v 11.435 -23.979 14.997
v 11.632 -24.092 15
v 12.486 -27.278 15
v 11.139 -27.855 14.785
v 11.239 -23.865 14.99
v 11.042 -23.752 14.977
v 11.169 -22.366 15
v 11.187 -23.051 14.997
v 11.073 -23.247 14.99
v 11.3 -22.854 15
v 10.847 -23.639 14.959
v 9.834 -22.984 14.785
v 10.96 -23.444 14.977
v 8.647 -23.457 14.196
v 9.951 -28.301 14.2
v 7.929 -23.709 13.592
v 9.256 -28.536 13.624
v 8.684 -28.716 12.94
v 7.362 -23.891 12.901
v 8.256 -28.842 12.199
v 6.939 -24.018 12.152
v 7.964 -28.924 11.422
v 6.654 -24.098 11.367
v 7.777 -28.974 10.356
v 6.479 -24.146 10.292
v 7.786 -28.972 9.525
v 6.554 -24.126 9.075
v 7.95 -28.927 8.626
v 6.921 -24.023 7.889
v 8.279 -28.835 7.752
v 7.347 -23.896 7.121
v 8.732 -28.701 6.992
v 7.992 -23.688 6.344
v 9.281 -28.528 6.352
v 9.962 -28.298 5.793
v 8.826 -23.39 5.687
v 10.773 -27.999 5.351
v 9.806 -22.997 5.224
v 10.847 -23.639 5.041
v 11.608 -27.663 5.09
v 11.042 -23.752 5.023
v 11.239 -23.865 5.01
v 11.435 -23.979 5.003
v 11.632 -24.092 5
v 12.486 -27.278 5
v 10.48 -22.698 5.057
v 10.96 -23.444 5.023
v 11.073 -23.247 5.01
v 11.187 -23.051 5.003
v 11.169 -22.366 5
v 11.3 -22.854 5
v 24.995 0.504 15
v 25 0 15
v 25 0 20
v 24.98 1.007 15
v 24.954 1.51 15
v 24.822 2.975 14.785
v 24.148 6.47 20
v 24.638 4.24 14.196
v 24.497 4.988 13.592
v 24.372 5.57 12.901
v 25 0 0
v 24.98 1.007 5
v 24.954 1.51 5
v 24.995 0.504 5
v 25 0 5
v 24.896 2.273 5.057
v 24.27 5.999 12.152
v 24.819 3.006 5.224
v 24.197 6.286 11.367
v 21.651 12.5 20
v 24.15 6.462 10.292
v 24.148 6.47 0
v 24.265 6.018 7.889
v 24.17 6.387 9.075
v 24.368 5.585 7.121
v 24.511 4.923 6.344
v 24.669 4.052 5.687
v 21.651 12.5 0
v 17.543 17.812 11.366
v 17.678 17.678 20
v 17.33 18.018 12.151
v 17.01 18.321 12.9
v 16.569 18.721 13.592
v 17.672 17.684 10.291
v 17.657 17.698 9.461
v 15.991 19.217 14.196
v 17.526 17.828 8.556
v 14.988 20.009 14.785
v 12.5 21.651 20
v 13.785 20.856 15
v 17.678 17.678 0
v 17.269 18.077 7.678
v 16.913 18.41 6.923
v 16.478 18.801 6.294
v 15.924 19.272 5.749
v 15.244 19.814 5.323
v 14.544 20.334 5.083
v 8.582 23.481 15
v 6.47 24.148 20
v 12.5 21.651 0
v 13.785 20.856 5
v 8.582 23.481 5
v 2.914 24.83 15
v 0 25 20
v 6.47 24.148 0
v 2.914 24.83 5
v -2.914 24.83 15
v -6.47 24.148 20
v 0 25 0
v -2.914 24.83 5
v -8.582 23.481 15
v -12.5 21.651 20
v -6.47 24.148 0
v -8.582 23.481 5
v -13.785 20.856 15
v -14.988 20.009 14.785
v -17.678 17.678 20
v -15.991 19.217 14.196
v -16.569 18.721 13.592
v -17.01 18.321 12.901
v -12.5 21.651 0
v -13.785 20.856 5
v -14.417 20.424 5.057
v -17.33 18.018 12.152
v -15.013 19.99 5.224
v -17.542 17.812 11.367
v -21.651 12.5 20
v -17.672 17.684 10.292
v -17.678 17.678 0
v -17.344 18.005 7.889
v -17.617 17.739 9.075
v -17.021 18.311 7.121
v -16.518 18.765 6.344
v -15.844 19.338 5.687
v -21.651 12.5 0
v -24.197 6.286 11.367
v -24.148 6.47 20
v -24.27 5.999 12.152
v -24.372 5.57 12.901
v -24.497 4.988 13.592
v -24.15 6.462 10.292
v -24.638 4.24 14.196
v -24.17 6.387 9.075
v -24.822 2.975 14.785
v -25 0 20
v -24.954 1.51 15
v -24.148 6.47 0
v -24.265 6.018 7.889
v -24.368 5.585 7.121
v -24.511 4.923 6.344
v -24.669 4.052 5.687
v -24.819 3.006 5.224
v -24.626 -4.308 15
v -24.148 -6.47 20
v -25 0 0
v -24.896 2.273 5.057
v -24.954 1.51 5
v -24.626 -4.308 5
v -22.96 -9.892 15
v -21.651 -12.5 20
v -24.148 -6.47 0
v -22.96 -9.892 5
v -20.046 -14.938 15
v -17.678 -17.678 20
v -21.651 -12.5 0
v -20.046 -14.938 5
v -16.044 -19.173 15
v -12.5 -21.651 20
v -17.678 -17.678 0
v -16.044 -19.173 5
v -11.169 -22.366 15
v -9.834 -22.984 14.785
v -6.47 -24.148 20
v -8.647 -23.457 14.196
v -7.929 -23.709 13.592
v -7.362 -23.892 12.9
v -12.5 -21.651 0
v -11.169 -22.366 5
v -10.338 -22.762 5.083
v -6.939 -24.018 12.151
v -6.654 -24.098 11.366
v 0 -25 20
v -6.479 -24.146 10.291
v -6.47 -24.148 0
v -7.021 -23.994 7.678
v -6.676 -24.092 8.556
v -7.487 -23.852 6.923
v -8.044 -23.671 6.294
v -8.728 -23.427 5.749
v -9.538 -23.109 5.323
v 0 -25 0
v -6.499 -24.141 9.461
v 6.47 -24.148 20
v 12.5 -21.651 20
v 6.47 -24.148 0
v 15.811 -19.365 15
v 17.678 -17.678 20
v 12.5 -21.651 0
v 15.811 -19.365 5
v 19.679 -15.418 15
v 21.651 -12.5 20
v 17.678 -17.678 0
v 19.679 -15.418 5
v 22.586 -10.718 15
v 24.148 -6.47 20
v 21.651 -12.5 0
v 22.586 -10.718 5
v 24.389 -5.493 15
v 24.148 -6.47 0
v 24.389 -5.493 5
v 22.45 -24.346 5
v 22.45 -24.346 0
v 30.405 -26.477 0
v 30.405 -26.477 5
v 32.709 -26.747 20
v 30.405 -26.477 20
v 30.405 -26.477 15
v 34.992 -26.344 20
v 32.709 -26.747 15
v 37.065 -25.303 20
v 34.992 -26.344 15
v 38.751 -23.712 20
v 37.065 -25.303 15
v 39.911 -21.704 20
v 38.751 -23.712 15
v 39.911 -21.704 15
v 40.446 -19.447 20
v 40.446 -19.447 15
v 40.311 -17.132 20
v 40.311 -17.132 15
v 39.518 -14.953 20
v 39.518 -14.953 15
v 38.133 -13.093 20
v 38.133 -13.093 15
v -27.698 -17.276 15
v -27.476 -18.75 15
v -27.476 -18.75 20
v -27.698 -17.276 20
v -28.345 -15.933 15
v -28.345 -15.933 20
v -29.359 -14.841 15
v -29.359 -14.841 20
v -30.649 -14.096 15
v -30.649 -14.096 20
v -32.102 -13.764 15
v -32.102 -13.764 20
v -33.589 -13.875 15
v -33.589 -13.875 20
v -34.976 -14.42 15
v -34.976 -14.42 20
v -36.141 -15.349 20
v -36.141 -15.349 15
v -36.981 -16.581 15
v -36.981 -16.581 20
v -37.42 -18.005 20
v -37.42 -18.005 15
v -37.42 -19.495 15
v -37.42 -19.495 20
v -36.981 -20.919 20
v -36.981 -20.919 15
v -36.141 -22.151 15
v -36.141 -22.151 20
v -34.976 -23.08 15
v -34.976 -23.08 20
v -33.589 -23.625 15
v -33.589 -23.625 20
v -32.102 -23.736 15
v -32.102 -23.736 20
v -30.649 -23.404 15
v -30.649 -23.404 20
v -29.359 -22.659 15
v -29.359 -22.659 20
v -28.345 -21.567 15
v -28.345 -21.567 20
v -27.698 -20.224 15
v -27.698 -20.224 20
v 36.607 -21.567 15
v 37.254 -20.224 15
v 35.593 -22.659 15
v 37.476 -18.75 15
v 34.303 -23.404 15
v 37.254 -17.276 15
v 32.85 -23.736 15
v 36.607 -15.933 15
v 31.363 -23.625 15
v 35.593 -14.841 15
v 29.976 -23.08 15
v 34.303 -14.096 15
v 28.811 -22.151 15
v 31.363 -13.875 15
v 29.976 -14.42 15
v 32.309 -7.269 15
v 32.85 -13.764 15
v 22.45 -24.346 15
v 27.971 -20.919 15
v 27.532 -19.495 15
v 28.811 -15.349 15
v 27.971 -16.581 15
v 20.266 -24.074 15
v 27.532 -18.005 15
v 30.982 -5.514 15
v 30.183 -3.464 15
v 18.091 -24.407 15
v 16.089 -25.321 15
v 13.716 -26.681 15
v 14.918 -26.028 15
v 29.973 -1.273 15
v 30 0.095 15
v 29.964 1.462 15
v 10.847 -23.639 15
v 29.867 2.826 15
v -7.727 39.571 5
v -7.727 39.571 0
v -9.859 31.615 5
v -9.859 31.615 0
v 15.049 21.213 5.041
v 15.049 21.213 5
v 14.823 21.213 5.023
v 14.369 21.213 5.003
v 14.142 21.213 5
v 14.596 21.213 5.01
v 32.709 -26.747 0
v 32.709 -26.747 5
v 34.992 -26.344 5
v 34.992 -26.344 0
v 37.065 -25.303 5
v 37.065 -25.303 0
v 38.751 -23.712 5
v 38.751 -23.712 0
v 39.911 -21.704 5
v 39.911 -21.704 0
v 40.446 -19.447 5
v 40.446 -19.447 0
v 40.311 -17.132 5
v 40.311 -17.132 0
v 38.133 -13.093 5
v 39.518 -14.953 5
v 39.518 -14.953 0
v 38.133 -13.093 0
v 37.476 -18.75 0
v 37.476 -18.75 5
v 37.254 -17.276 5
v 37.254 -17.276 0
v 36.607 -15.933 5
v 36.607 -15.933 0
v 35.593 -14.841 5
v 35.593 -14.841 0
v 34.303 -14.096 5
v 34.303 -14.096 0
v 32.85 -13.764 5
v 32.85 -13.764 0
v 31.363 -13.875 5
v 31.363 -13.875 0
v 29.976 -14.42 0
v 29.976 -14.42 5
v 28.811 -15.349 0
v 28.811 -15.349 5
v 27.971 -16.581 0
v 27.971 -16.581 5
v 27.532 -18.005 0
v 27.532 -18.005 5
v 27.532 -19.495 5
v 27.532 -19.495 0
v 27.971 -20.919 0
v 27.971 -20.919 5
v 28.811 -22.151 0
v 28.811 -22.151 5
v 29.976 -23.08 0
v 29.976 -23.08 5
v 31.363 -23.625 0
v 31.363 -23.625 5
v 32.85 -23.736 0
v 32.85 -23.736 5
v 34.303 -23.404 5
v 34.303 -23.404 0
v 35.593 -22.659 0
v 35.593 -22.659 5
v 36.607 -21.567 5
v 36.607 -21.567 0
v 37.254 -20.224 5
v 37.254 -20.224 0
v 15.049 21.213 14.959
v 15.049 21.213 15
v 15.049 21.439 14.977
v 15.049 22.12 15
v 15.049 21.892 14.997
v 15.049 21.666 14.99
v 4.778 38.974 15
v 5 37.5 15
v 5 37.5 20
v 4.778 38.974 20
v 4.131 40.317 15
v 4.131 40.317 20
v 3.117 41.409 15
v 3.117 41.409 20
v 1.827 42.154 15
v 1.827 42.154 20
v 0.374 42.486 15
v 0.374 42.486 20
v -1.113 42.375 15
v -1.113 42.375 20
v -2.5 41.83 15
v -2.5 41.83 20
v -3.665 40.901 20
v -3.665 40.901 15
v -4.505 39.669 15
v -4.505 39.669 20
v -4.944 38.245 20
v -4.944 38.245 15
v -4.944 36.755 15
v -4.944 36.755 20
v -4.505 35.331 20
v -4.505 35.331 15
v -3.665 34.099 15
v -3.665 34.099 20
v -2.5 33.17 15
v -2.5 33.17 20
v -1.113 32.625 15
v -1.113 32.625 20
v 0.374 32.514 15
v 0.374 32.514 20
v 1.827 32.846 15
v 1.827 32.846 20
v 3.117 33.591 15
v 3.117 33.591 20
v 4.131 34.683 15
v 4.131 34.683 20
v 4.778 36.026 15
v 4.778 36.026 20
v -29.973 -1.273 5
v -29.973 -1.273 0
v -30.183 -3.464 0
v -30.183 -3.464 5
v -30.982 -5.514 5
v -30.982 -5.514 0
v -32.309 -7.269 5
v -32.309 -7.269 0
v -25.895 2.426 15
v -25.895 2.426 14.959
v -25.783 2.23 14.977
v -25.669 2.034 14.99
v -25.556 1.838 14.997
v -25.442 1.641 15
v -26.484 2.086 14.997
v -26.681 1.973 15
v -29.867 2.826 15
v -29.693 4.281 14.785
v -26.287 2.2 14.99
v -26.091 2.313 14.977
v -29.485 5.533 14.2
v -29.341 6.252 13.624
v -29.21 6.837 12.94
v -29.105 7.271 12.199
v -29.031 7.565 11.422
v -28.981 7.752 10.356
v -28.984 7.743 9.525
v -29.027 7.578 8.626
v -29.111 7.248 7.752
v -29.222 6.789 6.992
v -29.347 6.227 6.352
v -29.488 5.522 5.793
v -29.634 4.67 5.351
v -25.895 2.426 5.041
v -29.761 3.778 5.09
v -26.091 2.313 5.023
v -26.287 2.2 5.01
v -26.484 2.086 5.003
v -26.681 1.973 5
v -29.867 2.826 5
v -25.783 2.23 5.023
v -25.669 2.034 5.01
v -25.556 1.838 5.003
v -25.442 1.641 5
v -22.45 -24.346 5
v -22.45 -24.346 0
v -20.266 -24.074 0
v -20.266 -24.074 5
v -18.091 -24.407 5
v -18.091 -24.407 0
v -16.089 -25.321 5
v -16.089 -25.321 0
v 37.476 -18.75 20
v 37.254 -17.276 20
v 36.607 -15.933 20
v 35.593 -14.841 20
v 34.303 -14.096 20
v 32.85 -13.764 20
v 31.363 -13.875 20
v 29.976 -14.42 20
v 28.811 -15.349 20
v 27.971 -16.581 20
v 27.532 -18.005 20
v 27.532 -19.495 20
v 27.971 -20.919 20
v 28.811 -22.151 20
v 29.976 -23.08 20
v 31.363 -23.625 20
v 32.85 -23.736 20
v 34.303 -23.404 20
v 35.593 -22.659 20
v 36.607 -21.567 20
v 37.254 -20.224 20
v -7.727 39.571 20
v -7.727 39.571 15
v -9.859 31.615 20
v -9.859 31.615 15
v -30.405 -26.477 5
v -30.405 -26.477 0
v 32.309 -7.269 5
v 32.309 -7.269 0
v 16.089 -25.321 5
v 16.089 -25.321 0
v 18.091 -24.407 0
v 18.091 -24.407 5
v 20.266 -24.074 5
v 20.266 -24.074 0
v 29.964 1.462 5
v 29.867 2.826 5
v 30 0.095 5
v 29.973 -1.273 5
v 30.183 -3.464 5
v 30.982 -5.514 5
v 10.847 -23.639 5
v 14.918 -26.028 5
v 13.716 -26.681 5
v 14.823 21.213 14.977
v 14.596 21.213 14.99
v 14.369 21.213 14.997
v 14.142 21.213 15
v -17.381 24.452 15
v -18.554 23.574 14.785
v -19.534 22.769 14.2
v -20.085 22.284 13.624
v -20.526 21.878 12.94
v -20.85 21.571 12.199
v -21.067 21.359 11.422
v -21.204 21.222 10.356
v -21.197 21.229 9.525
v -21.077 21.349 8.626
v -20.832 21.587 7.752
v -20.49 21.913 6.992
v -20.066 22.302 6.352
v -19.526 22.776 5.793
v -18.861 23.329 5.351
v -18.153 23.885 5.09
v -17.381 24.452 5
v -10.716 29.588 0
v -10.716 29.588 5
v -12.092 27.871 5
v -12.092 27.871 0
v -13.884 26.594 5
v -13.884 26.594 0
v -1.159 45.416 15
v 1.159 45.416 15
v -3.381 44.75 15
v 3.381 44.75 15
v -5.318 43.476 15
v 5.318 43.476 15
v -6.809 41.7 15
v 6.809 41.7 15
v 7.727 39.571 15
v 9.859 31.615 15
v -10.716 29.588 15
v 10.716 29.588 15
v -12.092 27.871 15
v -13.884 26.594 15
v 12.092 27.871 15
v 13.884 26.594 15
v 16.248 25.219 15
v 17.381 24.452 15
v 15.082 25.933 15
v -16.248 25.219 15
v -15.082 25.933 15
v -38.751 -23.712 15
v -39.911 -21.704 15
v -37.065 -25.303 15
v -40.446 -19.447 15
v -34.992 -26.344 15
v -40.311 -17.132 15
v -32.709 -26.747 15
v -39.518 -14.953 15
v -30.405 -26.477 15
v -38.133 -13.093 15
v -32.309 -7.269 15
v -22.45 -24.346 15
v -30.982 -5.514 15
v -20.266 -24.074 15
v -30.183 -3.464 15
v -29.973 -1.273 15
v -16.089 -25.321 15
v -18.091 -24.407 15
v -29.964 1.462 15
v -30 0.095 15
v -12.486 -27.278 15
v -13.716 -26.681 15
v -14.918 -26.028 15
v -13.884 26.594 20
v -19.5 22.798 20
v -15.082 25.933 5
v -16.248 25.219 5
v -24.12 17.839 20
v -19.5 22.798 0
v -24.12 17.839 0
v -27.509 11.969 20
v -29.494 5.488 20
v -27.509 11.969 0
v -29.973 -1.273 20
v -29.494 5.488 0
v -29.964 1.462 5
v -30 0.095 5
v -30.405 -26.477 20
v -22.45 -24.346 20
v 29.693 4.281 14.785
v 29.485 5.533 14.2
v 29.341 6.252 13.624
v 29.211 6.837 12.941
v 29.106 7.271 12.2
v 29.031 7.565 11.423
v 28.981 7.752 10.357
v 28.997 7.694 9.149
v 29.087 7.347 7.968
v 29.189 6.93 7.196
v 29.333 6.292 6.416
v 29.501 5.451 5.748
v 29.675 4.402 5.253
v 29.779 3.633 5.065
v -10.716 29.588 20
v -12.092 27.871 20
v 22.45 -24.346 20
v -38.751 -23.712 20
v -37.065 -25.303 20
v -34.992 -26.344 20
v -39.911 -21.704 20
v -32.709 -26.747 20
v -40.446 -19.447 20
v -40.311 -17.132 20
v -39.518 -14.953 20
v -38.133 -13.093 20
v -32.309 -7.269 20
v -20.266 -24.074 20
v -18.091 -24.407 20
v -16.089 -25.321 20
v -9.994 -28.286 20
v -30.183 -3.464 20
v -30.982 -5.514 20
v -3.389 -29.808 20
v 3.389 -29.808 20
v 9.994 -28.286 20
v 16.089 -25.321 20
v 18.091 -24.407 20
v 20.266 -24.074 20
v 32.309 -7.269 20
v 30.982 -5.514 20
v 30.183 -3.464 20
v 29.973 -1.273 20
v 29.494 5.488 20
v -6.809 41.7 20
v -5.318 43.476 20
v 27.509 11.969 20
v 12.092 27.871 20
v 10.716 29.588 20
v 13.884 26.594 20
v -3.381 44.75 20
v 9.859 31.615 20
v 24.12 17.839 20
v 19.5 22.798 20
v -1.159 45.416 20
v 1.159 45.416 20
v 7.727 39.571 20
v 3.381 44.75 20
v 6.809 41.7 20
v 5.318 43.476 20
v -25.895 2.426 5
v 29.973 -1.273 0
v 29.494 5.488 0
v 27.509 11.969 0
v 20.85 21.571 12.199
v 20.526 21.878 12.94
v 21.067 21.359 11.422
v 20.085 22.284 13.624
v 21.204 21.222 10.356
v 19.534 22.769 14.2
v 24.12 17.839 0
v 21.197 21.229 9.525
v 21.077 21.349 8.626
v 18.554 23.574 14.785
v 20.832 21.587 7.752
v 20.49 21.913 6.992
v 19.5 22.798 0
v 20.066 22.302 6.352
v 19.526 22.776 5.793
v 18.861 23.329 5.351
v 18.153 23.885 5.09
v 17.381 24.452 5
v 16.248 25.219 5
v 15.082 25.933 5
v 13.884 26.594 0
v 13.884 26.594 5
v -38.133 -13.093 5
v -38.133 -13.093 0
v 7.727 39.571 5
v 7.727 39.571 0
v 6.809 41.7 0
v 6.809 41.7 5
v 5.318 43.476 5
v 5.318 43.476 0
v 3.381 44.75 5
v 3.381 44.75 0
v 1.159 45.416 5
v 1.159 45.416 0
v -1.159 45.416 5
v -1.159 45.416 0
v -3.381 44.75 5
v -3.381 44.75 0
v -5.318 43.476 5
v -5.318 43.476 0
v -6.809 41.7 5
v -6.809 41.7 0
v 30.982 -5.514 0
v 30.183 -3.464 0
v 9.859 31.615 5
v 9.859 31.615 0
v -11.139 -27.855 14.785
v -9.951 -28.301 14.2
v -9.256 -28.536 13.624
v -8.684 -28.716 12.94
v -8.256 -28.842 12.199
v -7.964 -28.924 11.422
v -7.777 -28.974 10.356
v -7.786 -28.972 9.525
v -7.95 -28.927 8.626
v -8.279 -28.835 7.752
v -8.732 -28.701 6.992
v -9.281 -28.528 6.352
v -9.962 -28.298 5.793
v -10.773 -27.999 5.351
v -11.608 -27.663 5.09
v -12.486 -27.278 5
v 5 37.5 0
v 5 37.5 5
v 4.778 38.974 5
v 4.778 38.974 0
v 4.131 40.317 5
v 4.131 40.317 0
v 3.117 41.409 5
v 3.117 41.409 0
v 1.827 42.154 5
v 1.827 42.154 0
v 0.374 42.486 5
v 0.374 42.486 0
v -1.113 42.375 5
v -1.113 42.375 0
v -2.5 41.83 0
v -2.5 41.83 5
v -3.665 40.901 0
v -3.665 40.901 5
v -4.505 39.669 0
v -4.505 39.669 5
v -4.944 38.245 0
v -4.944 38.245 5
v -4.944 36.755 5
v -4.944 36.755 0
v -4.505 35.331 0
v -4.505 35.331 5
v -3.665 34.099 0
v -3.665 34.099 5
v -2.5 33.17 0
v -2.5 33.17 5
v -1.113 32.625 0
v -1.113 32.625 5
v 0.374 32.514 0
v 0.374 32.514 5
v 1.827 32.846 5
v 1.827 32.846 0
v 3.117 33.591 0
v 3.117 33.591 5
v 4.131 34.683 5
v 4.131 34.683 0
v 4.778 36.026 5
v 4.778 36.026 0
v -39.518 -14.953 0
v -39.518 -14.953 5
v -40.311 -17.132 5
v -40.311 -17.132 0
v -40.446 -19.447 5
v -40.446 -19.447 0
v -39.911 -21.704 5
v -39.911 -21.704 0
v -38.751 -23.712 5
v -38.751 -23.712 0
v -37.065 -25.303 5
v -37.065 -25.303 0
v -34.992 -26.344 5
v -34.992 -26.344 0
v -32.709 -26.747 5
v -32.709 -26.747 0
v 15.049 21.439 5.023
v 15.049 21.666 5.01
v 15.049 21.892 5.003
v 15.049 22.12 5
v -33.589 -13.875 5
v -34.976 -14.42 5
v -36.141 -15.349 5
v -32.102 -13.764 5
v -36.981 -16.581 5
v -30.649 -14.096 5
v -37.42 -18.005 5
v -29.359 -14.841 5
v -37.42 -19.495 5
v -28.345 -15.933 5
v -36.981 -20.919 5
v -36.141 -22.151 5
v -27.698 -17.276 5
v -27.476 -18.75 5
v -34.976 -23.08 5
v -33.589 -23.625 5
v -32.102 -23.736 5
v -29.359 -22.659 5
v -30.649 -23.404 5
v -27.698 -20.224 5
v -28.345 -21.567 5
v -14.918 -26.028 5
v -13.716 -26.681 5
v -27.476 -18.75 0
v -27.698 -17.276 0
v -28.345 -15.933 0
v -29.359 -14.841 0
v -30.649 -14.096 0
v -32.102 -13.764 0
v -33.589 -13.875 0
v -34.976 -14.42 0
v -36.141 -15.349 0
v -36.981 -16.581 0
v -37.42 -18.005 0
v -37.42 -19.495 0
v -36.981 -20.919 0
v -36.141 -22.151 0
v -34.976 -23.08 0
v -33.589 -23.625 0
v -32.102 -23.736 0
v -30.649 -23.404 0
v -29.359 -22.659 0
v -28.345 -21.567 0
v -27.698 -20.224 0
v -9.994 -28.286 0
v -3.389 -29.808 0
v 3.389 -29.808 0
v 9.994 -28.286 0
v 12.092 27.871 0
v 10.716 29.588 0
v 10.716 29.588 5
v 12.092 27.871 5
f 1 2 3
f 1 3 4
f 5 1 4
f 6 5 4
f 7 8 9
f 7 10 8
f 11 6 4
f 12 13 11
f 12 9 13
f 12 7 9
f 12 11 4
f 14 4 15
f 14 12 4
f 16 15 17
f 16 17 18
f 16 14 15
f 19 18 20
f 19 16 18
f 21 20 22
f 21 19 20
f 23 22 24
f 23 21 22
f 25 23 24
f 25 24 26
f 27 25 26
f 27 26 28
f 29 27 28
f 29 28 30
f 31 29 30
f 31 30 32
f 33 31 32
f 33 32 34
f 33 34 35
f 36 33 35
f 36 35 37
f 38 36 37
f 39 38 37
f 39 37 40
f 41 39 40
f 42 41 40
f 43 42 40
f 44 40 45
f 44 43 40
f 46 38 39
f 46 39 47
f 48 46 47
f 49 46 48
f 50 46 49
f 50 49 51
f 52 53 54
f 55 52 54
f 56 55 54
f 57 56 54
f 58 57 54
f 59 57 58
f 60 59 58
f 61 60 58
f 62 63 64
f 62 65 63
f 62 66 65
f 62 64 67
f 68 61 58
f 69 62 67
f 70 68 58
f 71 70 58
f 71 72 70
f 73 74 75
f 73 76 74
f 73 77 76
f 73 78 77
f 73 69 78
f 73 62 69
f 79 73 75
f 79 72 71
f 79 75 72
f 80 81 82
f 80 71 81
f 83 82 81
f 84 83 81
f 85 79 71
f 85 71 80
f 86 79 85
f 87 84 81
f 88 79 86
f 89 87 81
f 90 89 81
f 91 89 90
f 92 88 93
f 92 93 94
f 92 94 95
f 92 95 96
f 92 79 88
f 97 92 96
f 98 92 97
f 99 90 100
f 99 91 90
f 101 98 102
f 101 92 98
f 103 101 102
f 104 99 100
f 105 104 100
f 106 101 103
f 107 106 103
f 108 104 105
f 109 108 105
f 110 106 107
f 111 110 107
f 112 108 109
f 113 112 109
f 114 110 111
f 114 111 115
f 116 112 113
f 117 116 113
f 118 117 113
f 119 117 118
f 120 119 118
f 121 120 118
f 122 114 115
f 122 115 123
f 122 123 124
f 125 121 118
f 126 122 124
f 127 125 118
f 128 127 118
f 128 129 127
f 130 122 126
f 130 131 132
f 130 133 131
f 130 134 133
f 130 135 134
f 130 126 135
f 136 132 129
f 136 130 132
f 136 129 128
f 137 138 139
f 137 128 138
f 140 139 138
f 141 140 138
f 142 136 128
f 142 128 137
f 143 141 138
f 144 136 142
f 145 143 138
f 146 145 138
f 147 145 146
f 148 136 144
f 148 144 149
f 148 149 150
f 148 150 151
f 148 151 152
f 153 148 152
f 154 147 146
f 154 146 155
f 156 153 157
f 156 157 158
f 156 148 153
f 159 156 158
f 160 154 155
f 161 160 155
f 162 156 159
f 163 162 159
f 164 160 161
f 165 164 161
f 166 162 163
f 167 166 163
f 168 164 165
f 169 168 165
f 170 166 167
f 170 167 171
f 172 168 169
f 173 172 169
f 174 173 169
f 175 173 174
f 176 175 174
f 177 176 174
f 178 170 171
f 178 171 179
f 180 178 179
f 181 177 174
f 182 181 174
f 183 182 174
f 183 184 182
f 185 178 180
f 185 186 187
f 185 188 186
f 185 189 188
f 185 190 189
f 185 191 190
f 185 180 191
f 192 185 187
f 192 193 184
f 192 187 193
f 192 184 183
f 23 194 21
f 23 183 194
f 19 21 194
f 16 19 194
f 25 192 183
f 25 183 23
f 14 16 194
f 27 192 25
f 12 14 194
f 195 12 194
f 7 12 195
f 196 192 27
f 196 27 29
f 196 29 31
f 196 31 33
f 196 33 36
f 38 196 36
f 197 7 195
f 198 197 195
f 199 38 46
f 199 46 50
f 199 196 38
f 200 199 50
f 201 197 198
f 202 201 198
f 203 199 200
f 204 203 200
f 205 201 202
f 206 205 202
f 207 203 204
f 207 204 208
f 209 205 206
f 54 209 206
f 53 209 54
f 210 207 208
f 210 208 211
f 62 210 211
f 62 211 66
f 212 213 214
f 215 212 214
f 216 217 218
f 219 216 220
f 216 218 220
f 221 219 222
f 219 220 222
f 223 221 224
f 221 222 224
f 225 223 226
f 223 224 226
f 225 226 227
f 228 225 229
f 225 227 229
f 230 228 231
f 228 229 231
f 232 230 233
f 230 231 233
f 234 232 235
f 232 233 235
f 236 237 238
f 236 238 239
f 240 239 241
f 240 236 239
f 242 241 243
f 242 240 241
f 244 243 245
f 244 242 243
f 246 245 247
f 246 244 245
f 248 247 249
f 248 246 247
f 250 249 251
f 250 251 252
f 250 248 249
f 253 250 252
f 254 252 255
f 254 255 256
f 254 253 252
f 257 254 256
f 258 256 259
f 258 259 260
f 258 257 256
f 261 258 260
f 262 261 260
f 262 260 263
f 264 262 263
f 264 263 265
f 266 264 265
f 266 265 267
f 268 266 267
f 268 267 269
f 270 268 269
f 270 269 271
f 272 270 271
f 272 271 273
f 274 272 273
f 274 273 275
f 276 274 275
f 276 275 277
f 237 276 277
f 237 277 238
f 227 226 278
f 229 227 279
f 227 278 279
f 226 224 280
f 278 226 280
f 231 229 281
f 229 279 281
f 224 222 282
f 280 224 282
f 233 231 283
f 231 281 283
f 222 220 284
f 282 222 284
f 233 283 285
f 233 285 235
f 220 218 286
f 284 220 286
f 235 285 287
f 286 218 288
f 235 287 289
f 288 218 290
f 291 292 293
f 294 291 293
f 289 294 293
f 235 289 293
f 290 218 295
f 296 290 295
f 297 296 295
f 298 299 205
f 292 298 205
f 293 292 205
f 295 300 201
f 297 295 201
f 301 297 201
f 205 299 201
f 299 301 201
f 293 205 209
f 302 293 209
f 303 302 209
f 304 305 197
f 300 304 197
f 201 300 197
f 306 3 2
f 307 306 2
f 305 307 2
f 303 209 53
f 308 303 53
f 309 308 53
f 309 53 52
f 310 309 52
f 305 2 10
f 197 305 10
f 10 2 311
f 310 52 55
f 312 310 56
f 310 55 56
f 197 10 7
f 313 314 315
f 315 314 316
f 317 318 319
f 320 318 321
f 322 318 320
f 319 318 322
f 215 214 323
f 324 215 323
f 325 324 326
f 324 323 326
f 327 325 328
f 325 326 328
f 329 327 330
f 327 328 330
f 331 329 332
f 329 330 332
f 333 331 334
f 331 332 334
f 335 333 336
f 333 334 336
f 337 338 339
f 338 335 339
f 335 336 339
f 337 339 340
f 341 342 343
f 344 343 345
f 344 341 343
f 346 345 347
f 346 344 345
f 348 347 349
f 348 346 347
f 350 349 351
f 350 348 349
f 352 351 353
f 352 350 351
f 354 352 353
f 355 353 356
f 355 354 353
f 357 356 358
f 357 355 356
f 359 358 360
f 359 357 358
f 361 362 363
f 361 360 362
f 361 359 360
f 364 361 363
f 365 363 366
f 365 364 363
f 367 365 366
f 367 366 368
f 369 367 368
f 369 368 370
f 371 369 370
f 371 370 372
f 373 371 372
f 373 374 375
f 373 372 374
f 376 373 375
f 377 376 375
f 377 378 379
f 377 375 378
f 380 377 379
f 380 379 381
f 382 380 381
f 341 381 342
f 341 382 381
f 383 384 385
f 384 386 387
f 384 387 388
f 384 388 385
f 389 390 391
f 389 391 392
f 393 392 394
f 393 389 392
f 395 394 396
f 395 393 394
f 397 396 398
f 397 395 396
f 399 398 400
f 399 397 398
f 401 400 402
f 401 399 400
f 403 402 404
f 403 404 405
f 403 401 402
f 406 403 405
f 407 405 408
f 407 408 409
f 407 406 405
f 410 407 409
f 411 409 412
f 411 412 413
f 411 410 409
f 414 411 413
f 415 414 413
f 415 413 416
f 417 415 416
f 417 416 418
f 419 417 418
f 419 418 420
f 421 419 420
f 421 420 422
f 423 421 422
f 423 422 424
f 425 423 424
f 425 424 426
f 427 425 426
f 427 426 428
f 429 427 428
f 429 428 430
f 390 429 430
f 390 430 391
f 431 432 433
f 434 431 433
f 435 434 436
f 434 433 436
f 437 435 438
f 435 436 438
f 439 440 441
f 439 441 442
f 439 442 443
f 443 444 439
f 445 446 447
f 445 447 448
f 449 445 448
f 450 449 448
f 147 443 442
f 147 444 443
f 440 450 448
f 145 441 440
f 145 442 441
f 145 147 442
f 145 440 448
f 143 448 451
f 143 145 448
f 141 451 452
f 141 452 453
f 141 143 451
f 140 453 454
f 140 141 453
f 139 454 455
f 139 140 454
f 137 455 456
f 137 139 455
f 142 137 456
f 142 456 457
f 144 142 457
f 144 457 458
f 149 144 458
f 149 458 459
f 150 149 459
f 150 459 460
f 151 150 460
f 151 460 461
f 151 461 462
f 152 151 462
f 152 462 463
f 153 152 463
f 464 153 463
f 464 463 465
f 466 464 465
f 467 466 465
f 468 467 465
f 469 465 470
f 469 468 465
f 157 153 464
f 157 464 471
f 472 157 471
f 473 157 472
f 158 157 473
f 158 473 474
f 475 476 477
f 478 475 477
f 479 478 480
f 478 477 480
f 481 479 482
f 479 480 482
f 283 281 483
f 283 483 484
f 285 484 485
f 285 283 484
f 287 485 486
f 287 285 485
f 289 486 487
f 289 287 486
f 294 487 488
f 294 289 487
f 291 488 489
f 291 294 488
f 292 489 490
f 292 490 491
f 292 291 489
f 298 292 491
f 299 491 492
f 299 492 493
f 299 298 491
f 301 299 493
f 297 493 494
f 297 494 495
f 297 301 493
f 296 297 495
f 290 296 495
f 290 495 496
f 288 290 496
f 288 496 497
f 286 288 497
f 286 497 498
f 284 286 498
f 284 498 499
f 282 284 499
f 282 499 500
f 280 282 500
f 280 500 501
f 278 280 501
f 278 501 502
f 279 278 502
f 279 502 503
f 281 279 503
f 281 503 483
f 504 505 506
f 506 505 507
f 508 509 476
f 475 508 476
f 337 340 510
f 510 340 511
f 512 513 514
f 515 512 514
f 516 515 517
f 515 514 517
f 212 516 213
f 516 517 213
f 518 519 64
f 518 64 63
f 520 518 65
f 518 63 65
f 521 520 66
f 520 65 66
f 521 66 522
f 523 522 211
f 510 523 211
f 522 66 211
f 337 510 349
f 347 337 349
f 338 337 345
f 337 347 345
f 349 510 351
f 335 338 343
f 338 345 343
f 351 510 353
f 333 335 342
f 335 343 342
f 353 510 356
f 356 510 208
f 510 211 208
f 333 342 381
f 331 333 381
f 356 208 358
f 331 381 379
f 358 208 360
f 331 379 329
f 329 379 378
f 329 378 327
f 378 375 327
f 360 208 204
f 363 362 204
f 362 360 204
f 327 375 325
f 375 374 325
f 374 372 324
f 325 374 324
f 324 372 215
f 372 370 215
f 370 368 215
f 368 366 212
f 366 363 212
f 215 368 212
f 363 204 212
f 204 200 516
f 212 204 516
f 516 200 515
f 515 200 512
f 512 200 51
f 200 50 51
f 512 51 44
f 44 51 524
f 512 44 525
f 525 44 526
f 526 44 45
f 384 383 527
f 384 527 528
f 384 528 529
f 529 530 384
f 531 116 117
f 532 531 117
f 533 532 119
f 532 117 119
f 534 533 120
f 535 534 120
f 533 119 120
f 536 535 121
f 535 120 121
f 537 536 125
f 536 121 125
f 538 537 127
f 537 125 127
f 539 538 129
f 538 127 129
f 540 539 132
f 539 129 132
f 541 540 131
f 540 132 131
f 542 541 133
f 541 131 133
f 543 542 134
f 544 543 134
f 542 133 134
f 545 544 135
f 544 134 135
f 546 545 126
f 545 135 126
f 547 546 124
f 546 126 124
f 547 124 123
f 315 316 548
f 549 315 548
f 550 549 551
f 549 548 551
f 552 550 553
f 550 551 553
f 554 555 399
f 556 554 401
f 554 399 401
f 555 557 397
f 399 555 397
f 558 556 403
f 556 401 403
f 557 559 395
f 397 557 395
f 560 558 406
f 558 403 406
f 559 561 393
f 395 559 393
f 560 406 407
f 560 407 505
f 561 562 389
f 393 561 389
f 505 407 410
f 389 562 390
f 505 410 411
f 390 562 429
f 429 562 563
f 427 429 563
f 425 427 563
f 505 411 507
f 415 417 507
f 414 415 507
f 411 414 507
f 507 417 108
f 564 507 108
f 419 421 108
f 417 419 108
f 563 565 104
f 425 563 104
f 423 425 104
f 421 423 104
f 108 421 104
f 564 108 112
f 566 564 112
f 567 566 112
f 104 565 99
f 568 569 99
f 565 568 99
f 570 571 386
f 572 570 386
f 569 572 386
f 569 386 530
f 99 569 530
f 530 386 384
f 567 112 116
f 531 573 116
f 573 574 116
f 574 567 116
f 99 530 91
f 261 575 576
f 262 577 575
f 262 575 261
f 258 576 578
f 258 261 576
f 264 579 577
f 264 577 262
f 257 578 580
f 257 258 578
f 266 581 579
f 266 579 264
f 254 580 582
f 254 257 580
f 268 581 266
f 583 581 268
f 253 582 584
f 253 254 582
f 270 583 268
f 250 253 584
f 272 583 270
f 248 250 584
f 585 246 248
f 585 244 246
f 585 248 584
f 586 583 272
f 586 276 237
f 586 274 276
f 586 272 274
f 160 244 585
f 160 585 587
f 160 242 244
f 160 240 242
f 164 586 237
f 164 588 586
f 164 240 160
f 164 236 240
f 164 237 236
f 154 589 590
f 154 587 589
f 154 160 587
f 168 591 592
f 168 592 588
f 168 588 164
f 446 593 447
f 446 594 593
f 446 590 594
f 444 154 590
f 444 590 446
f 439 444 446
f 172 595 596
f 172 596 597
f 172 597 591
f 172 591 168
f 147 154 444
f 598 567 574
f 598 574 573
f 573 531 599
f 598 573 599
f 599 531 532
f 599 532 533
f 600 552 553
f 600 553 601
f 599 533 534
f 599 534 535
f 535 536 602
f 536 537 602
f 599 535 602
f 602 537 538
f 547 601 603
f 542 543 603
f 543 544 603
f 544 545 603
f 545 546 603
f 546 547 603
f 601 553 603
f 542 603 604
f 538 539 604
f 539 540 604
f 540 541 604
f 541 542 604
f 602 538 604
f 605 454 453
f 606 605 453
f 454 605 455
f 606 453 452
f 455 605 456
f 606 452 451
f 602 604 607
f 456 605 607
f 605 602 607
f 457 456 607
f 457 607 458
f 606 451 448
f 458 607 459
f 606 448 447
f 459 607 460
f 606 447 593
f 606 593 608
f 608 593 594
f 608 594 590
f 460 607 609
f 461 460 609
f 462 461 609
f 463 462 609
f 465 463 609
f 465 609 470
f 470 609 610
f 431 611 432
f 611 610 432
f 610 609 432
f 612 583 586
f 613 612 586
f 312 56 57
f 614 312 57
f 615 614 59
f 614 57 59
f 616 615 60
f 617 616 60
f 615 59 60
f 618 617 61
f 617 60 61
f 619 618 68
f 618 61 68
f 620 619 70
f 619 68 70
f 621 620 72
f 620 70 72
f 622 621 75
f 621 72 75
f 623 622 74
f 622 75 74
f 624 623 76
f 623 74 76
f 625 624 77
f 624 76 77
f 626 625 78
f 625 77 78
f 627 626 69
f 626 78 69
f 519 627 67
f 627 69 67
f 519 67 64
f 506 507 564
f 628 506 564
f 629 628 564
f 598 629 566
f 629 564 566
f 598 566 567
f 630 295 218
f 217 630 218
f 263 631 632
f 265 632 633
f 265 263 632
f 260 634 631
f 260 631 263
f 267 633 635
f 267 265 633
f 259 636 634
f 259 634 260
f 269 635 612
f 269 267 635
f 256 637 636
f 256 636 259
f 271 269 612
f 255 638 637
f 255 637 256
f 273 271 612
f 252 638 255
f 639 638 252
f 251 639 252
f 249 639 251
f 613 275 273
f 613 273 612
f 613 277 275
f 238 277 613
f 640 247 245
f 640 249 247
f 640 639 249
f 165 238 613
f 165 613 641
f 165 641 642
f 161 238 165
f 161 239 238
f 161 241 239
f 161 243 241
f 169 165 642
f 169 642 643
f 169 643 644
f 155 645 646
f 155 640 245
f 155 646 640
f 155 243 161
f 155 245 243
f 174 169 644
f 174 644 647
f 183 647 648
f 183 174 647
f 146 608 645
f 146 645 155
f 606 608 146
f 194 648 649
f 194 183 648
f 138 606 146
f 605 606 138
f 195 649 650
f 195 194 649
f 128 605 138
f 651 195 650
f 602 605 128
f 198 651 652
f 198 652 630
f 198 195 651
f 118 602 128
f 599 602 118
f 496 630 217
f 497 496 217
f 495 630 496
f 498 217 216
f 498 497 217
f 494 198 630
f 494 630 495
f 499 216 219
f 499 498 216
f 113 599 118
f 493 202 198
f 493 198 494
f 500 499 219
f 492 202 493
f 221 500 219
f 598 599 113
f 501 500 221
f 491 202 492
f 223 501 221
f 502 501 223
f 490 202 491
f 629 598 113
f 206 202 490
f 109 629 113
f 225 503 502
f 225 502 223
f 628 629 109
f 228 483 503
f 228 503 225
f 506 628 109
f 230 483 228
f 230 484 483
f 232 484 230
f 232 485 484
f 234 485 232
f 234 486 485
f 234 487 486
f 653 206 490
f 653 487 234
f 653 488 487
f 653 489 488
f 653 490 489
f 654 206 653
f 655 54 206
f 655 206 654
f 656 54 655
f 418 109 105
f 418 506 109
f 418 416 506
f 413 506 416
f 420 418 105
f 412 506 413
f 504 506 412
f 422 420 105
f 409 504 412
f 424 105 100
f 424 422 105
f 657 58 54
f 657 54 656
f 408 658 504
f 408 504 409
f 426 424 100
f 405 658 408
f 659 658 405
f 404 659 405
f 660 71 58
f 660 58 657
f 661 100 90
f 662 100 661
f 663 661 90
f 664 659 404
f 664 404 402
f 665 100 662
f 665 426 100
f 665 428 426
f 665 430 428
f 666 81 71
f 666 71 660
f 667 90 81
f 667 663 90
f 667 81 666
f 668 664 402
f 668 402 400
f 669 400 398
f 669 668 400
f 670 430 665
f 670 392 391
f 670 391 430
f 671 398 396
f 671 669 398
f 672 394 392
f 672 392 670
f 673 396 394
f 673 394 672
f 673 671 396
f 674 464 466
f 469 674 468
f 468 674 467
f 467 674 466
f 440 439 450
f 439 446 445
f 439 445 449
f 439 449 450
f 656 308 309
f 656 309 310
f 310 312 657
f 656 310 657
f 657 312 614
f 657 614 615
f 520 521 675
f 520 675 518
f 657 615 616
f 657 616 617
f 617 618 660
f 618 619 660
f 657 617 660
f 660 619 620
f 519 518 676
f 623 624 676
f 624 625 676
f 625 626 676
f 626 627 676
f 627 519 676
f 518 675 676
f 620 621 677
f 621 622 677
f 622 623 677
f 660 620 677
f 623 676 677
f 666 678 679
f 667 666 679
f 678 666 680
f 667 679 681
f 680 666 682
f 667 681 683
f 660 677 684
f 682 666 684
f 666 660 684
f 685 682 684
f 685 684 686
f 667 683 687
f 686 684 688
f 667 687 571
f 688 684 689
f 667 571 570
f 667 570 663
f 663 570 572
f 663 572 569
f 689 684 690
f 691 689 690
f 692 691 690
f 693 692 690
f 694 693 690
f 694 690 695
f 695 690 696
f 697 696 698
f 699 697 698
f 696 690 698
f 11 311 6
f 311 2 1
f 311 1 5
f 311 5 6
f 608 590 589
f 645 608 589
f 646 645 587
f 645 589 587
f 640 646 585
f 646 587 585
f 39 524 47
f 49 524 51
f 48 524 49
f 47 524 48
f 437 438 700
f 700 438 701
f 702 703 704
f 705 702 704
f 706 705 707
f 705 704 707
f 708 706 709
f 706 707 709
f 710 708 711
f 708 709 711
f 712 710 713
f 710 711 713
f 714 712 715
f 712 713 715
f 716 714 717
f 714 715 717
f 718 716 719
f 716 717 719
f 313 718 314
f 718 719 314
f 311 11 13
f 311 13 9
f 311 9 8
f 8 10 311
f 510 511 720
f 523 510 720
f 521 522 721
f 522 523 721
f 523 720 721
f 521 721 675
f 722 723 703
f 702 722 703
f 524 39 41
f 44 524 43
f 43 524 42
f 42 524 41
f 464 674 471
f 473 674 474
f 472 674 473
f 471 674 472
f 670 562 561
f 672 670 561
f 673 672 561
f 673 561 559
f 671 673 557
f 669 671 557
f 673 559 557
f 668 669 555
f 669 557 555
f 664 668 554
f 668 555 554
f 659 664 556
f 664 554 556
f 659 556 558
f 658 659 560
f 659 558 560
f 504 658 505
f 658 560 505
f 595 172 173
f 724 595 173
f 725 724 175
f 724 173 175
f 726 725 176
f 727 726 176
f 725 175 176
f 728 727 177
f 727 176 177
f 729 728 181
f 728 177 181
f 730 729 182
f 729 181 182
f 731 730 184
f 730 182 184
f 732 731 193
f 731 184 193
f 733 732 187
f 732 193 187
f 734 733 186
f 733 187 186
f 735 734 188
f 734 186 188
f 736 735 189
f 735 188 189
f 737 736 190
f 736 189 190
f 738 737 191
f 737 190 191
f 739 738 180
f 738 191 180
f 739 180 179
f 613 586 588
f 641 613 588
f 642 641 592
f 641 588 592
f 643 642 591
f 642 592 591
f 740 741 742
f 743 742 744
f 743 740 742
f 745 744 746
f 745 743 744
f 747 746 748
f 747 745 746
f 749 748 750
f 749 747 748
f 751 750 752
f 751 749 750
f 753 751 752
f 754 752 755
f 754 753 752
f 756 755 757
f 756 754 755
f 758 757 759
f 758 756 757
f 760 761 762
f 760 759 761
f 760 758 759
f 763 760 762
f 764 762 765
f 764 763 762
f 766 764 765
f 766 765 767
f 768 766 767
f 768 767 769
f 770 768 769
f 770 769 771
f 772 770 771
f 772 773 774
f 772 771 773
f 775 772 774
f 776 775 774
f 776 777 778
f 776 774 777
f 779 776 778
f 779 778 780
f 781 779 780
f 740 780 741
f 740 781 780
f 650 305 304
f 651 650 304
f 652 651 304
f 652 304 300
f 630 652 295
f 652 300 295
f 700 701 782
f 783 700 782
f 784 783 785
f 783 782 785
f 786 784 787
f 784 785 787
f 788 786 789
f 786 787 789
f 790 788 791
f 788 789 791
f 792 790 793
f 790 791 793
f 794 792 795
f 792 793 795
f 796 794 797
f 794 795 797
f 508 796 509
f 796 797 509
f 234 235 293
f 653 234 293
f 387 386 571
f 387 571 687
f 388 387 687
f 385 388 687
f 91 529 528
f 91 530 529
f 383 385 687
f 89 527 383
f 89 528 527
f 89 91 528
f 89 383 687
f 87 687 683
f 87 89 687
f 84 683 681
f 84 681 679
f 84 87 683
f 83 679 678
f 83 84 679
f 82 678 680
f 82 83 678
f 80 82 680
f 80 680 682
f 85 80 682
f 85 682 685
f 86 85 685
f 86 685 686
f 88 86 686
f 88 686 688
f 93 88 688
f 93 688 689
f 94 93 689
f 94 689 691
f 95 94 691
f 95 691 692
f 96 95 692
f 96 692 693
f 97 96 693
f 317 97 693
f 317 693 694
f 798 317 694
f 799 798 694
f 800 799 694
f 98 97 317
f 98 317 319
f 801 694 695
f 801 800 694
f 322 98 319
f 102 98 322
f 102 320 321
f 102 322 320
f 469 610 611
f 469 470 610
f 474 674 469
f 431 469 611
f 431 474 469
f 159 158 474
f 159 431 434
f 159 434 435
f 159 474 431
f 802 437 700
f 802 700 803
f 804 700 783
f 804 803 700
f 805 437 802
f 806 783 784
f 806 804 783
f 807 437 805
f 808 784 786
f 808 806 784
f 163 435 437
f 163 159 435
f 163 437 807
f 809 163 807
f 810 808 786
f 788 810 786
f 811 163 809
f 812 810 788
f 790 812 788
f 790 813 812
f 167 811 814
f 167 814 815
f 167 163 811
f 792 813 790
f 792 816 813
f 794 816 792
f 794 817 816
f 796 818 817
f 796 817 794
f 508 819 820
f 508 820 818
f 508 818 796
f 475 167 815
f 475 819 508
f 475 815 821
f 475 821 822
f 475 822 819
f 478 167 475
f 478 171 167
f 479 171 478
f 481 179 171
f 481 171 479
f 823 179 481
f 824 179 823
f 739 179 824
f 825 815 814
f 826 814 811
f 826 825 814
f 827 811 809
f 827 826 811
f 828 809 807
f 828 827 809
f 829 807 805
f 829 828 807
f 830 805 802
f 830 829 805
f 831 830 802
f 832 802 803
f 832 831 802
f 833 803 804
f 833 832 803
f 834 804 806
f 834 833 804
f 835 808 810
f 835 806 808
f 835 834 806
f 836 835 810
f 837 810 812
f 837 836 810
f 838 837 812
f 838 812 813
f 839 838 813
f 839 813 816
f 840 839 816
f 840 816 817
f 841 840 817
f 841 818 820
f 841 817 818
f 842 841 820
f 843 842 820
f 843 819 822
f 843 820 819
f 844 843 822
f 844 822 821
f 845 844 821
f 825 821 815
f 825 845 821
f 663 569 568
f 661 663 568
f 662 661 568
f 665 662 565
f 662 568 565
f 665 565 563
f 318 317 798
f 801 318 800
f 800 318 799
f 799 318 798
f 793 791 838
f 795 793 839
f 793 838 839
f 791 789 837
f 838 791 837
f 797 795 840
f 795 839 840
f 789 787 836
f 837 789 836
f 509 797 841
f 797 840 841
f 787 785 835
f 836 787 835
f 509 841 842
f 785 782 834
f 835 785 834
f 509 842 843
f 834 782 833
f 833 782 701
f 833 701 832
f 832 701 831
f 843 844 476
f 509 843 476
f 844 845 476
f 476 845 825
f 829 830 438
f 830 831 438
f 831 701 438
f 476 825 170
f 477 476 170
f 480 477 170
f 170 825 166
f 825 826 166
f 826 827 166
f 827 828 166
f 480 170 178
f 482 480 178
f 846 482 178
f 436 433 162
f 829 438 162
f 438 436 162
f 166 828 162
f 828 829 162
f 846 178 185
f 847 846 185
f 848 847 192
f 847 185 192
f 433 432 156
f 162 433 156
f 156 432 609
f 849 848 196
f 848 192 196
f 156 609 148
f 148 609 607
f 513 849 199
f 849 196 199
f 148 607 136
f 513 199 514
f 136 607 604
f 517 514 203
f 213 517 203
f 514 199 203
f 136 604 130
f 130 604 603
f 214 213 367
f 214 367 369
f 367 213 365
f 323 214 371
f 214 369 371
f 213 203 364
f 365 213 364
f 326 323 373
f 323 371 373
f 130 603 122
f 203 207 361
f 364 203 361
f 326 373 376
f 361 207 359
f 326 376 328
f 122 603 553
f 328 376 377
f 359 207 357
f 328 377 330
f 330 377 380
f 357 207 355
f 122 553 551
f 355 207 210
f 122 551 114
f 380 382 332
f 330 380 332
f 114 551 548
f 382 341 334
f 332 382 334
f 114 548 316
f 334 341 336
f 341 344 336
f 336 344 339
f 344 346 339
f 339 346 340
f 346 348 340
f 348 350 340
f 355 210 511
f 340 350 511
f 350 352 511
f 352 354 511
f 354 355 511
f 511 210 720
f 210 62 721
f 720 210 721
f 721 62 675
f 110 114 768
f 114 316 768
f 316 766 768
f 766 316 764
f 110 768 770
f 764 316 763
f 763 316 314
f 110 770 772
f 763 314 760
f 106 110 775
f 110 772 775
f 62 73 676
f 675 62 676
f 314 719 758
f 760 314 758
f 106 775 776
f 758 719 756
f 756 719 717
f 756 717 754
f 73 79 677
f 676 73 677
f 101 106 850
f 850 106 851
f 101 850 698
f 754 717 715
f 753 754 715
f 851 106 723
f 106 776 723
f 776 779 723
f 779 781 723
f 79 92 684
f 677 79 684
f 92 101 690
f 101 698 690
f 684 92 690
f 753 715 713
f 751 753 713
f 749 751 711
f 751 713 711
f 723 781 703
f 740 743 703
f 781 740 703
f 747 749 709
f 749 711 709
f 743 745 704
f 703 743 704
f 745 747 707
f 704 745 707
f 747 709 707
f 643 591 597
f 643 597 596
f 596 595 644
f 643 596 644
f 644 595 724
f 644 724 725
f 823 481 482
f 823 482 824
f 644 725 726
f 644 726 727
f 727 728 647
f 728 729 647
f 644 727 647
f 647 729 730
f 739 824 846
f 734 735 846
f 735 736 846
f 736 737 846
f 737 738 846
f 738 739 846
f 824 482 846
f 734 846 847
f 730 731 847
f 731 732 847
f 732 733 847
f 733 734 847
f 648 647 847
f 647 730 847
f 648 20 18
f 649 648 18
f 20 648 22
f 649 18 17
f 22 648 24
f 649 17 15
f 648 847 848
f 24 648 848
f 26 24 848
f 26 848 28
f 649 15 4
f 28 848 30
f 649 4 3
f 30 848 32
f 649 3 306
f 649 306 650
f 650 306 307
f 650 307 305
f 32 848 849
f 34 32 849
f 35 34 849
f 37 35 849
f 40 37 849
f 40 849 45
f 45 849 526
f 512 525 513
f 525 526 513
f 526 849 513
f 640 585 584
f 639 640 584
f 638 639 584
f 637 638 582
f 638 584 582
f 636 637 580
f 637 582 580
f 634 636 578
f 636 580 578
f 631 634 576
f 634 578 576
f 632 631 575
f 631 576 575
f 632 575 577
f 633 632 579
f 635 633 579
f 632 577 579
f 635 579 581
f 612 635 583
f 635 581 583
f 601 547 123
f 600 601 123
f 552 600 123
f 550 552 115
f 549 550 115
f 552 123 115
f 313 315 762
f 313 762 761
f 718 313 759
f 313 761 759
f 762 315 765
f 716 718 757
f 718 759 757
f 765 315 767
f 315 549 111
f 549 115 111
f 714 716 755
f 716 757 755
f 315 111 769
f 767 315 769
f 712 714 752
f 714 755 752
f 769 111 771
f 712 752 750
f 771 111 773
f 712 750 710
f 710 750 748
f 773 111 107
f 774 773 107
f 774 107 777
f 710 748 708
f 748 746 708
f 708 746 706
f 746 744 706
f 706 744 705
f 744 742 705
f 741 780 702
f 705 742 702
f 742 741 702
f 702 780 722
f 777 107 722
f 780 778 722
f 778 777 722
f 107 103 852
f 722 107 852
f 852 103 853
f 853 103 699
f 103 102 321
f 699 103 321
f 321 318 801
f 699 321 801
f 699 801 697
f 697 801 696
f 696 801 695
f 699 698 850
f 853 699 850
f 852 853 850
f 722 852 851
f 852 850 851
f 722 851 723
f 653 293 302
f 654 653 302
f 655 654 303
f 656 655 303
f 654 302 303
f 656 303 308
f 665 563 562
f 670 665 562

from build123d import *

# Parameters (mm, degrees)
SKETCH1_R           = 25
SKETCH1_R_2         = 5
BOSS_EXTRUDE1_DEPTH = 20
CUT_EXTRUDE2_DEPTH  = 65.097993278
CUT_EXTRUDE5_DEPTH  = 65.09799338
SKETCH17_W          = 27.497524216
SKETCH17_H          = 10
CUT_EXTRUDE7_DEPTH  = 69.272212154
CIRPATTERN1_COUNT   = 3


with BuildPart() as part:
    # Sketch1 → Boss-Extrude1 (new body)
    with BuildSketch(Plane.XY):
        with BuildLine():
            Line((-7.72740661, 39.570552361), (-9.859096528, 31.614977283))
            ThreePointArc((-9.859096528, 31.614977283), (-11.344452128, 28.681851078), (-13.884081425, 26.593839192))
            ThreePointArc((-13.884081425, 26.593839192), (-25.980762114, 15), (-29.972981037, -1.272952374))
            ThreePointArc((-29.972981037, -1.272952374), (-30.511437725, -4.516341804), (-32.308921731, -7.26926059))
            Line((-32.308921731, -7.26926059), (-38.132806891, -13.093145751))
            ThreePointArc((-38.132806891, -13.093145751), (-39.404155872, -22.75), (-30.405400281, -26.47740661))
            Line((-30.405400281, -26.47740661), (-22.449825203, -24.345716693))
            ThreePointArc((-22.449825203, -24.345716693), (-19.166985597, -24.165509274), (-16.088899612, -25.320886818))
            ThreePointArc((-16.088899612, -25.320886818), (0, -30), (16.088899612, -25.320886818))
            ThreePointArc((16.088899612, -25.320886818), (19.166985597, -24.165509274), (22.449825203, -24.345716693))
            Line((22.449825203, -24.345716693), (30.405400281, -26.47740661))
            ThreePointArc((30.405400281, -26.47740661), (39.404155872, -22.75), (38.132806891, -13.093145751))
            Line((38.132806891, -13.093145751), (32.308921731, -7.26926059))
            ThreePointArc((32.308921731, -7.26926059), (30.511437725, -4.516341804), (29.972981037, -1.272952374))
            ThreePointArc((29.972981037, -1.272952374), (25.980762114, 15), (13.884081425, 26.593839192))
            ThreePointArc((13.884081425, 26.593839192), (11.344452128, 28.681851078), (9.859096528, 31.614977283))
            Line((9.859096528, 31.614977283), (7.72740661, 39.570552361))
            ThreePointArc((7.72740661, 39.570552361), (0, 45.5), (-7.72740661, 39.570552361))
        make_face()
        Circle(SKETCH1_R, mode=Mode.SUBTRACT)
        with Locations((0, 37.5)):
            Circle(SKETCH1_R_2, mode=Mode.SUBTRACT)
        with Locations((32.475952642, -18.75)):
            Circle(SKETCH1_R_2, mode=Mode.SUBTRACT)
        with Locations((-32.475952642, -18.75)):
            Circle(SKETCH1_R_2, mode=Mode.SUBTRACT)
    extrude(amount=BOSS_EXTRUDE1_DEPTH)

    # Sketch14 → Cut-Extrude2 (cut, through all)
    with BuildSketch(Plane(origin=(0, 0, 0), x_dir=(-0.7071067811865461, 0.707106781186549, 0), z_dir=(-0.707106781186549, -0.7071067811865461, 0))):
        with BuildLine():
            Line((19.111501151, -15), (5, -15))
            ThreePointArc((5, -15), (0, -10), (5, -5))
            Line((5, -5), (19.111501151, -5))
            ThreePointArc((19.111501151, -5), (24.111501151, -10), (19.111501151, -15))
        make_face()
    cut_extrude2 = extrude(amount=-CUT_EXTRUDE2_DEPTH, mode=Mode.SUBTRACT)

    # Sketch15 → Cut-Extrude5 (cut, through all)
    with BuildSketch(Plane(origin=(0, 0, 0), x_dir=(0.7071067811865489, 0.7071067811865462, 0), z_dir=(-0.7071067811865462, 0.7071067811865489, 0))):
        with BuildLine():
            Line((17.551379006, -15), (5, -15))
            ThreePointArc((5, -15), (0, -10), (5, -5))
            Line((5, -5), (17.551379006, -5))
            ThreePointArc((17.551379006, -5), (22.551379006, -10), (17.551379006, -15))
        make_face()
    cut_extrude5 = extrude(amount=CUT_EXTRUDE5_DEPTH, mode=Mode.SUBTRACT)

    # Sketch17 → Cut-Extrude7 (cut, through all)
    with BuildSketch(Plane(origin=(0, 21.213203436, 0), x_dir=(-1, 0, 0), z_dir=(0, -1, 0))):
        with Locations((-1.299865662, -10)):
            Rectangle(SKETCH17_W, SKETCH17_H)
    cut_extrude7 = extrude(amount=-CUT_EXTRUDE7_DEPTH, mode=Mode.SUBTRACT)

    # CirPattern1: Cut-Extrude2, Cut-Extrude5, Cut-Extrude7 ×3 about axis
    cirpattern1_axis = Axis((0, 0, 0), (0, 0, 1))
    add([cut_extrude2.rotate(cirpattern1_axis, i * 360 / CIRPATTERN1_COUNT) for i in range(1, CIRPATTERN1_COUNT)], mode=Mode.SUBTRACT)
    add([cut_extrude5.rotate(cirpattern1_axis, i * 360 / CIRPATTERN1_COUNT) for i in range(1, CIRPATTERN1_COUNT)], mode=Mode.SUBTRACT)
    add([cut_extrude7.rotate(cirpattern1_axis, i * 360 / CIRPATTERN1_COUNT) for i in range(1, CIRPATTERN1_COUNT)], mode=Mode.SUBTRACT)


solid = part.part
